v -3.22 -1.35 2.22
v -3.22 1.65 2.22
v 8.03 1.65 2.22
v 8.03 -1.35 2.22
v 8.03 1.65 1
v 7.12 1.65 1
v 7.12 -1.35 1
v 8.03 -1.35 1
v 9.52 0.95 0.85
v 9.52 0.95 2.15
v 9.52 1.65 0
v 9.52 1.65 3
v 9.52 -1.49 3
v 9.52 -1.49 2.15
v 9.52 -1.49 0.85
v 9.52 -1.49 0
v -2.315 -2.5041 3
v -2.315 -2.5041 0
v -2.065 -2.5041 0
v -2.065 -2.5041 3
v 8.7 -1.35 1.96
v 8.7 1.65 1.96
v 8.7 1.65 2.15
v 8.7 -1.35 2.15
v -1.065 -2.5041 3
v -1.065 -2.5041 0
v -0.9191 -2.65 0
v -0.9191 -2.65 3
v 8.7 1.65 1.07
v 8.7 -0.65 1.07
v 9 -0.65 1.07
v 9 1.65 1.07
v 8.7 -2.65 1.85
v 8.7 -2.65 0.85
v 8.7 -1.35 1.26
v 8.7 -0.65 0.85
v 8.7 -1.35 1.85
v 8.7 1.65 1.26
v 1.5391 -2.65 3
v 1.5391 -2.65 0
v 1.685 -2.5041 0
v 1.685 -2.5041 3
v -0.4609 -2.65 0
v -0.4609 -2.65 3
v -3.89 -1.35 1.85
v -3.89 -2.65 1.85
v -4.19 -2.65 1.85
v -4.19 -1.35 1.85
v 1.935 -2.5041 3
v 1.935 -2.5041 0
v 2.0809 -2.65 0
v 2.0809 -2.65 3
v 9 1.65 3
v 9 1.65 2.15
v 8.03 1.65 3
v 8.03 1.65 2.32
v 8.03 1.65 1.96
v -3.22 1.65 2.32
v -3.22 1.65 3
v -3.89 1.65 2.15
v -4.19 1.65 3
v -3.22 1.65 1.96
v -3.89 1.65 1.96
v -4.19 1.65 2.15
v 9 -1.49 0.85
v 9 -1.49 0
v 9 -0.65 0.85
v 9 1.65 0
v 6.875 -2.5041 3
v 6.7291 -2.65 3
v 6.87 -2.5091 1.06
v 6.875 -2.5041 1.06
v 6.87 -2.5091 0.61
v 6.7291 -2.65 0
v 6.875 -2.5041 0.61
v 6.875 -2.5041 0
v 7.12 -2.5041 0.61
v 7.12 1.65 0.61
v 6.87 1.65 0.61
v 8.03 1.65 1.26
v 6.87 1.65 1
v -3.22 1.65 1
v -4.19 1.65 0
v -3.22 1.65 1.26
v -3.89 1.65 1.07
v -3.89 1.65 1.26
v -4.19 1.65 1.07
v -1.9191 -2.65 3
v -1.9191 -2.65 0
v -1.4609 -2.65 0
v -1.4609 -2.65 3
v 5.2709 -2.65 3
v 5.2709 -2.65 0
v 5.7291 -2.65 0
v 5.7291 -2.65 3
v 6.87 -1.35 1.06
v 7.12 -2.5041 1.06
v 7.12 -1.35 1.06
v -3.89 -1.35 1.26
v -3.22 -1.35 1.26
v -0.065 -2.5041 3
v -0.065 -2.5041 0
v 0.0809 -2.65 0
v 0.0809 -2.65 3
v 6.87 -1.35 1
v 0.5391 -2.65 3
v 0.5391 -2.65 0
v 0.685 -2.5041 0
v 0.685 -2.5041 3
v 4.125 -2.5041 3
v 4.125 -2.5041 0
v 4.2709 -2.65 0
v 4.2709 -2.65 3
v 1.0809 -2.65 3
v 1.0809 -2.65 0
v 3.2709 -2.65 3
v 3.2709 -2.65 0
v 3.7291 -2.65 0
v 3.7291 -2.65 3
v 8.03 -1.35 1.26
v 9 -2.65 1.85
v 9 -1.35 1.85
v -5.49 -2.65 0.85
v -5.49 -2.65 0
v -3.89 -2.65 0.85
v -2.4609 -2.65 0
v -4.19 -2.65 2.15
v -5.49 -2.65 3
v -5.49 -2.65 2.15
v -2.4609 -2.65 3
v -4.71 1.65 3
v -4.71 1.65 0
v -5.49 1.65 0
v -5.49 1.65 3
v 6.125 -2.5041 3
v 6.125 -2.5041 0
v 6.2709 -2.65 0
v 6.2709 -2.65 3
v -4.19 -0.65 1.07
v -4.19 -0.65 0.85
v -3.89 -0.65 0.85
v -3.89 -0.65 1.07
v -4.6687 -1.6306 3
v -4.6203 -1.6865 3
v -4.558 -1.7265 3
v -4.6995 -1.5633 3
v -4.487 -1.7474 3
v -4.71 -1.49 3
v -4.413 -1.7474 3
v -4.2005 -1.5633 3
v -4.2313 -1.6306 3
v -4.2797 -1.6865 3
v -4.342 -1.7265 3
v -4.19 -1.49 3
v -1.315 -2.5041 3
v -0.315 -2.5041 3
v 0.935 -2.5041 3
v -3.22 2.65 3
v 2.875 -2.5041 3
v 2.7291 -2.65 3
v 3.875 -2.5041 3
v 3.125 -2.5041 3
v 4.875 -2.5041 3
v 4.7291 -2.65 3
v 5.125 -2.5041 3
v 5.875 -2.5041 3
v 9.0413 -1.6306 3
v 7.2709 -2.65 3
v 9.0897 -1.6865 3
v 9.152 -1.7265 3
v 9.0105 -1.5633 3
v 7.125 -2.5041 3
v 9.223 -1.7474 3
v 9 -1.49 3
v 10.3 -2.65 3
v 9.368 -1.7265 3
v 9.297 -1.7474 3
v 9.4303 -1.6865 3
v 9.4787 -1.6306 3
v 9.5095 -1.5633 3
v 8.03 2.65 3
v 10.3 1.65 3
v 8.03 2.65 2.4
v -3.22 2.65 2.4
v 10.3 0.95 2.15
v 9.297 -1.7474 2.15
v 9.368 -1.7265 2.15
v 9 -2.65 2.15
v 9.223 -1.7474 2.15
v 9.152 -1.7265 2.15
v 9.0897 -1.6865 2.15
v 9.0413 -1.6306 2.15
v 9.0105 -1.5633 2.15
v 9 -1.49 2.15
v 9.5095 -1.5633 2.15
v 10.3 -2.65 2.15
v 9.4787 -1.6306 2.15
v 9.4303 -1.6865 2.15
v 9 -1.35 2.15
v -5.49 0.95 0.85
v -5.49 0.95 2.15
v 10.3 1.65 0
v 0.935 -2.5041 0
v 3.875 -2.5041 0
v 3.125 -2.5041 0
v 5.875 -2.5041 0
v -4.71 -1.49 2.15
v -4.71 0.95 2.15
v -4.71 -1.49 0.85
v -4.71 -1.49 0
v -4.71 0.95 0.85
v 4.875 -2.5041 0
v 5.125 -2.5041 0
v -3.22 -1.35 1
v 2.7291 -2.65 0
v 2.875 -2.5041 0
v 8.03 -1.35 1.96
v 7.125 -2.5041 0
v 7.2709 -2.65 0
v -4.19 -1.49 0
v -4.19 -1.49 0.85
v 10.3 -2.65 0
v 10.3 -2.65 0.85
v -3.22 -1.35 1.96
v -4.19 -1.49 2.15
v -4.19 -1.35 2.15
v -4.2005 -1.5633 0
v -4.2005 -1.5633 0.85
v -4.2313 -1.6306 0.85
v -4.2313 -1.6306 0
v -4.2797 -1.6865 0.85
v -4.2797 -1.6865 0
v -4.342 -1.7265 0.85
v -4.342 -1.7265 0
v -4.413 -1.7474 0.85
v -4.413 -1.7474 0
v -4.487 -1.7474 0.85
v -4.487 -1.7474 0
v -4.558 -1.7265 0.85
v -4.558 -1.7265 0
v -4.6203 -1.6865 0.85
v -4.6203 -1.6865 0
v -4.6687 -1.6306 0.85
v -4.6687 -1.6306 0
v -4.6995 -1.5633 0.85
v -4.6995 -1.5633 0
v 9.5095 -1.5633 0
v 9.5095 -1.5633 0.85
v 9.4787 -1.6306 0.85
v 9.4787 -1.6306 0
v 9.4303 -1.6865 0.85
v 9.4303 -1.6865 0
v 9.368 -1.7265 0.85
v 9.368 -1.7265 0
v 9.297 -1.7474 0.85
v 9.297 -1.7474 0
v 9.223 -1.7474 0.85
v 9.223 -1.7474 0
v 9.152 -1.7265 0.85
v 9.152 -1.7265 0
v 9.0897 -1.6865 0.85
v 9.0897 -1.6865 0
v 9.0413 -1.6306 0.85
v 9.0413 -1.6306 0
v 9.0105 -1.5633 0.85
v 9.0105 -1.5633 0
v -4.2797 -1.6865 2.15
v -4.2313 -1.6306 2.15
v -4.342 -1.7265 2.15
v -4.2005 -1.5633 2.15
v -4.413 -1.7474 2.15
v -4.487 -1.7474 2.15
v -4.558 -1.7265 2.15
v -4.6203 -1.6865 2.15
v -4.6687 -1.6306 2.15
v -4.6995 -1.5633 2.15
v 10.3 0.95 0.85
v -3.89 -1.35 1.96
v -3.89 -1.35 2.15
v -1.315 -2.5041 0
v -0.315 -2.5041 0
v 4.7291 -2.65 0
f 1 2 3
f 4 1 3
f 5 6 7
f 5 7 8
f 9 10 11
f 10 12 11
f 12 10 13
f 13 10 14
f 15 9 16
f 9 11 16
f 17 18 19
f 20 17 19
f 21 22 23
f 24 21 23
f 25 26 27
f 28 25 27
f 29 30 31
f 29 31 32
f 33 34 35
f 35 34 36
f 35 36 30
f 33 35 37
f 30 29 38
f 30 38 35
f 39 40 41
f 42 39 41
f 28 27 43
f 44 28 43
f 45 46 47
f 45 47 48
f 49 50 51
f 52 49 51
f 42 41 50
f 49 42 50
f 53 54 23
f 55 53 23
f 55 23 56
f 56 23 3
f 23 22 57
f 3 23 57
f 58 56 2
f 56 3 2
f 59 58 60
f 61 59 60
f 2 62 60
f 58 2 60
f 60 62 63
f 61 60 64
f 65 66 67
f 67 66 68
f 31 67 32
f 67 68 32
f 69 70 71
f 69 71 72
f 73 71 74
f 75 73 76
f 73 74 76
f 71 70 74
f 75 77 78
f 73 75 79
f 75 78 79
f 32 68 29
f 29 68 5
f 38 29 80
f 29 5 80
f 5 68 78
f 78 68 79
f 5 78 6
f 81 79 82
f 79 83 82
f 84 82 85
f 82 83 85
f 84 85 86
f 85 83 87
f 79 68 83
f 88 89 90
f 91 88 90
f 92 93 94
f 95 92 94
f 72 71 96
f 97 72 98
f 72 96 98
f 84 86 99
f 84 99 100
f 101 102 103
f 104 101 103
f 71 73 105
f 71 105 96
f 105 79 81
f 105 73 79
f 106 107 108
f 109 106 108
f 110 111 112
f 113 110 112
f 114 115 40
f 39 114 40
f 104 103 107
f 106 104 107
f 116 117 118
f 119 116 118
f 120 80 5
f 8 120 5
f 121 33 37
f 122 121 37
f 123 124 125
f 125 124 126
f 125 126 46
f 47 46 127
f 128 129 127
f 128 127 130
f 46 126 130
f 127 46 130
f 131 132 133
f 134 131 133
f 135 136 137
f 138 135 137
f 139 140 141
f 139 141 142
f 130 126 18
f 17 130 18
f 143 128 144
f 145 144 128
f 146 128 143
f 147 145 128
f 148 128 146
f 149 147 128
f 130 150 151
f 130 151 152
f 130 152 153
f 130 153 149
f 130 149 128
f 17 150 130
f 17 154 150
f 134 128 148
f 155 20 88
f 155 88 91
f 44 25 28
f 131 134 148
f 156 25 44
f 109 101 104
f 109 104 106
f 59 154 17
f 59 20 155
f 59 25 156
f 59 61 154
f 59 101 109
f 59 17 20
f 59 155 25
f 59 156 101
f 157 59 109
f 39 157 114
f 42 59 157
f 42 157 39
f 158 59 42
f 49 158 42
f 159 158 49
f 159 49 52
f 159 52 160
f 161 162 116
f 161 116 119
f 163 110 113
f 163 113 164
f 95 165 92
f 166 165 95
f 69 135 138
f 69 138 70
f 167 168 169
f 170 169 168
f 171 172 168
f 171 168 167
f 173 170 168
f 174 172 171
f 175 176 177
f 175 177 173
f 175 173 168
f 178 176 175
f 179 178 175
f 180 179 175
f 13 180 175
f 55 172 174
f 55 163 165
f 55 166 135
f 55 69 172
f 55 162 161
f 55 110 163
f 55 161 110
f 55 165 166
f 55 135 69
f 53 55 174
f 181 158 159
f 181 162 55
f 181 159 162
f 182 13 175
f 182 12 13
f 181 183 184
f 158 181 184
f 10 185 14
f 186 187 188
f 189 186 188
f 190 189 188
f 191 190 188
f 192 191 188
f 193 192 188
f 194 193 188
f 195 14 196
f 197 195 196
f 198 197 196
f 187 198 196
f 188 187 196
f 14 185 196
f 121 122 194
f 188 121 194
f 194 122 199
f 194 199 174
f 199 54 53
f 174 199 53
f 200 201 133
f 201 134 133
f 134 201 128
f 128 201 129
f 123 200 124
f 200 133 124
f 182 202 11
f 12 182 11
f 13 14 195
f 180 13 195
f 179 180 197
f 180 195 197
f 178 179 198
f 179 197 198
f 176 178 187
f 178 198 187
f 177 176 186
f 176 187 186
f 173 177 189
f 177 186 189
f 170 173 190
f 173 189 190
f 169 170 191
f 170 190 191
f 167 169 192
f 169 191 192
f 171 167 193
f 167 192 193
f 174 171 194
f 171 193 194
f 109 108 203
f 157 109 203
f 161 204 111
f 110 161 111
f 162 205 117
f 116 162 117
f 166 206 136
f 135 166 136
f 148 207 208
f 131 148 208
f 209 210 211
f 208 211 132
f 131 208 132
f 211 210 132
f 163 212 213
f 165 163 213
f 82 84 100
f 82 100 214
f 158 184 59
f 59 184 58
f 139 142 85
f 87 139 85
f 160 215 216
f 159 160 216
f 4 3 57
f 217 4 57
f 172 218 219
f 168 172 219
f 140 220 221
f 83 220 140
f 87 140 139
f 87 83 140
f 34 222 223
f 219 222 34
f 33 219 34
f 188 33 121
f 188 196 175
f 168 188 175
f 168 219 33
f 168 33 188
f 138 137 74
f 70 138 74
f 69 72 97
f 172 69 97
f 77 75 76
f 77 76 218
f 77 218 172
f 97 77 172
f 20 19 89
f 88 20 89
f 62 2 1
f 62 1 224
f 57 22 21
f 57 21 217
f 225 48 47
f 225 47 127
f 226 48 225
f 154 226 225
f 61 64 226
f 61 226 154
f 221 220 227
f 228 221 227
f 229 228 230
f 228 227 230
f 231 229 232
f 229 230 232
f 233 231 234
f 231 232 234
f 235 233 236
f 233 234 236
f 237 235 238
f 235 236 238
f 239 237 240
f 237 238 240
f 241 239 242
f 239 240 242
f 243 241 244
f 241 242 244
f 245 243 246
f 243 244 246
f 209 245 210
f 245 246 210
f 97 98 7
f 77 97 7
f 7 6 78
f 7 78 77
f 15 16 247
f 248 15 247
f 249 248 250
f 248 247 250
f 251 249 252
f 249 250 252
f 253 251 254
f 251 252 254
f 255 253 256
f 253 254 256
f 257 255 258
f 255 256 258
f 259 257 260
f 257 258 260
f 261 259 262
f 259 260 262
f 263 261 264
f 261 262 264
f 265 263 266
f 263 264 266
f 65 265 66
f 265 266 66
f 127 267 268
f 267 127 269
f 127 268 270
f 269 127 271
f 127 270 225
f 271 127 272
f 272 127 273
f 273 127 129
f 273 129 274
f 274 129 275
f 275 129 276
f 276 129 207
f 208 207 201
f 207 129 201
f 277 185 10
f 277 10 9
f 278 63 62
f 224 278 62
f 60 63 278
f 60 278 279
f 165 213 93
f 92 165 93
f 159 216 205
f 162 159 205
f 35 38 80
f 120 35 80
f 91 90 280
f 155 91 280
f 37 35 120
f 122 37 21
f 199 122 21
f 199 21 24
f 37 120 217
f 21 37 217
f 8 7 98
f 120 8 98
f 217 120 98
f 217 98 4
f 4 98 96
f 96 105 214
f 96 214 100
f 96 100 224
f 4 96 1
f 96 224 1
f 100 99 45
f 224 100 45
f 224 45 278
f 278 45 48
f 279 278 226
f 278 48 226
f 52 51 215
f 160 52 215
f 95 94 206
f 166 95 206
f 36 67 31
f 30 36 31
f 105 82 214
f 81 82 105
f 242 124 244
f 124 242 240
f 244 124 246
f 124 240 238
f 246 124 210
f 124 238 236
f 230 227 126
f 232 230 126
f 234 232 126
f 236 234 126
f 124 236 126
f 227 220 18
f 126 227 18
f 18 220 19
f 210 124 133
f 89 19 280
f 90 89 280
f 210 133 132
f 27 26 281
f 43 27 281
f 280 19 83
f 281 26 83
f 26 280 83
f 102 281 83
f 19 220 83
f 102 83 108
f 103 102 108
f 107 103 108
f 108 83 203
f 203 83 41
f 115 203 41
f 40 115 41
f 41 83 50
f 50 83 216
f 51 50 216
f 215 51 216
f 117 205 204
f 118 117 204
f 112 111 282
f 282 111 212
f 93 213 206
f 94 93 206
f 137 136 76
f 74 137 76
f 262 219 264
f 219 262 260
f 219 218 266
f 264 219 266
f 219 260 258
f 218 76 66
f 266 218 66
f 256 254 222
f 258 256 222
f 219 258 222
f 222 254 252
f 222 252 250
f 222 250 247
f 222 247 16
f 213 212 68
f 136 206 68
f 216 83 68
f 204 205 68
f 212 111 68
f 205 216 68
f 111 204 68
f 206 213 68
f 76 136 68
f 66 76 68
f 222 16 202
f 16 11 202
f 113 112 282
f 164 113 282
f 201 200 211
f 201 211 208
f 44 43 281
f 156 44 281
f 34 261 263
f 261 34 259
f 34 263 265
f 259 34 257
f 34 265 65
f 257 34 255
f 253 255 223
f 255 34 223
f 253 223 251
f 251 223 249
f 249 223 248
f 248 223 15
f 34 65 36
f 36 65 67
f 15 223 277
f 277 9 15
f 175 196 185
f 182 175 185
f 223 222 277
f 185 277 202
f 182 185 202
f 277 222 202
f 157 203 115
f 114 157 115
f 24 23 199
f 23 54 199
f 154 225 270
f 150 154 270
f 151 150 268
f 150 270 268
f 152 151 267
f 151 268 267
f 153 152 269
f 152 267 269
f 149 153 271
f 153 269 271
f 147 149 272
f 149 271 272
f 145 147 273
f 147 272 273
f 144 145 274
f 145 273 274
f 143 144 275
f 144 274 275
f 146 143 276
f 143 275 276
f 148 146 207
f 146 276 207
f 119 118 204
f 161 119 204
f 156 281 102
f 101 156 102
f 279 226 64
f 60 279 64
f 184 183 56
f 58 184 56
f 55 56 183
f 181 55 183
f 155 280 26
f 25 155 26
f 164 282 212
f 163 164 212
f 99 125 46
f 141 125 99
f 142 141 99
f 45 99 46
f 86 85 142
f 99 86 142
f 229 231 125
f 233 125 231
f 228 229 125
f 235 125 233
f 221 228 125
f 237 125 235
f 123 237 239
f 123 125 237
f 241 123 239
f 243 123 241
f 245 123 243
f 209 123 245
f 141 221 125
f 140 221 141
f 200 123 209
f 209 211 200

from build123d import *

# Parameters (mm, degrees)
BOSS_EXTRUDE1_DEPTH             = 3
CUT_EXTRUDE1_DEPTH              = 19.761966848
SKETCH3_W                       = 16.06
SKETCH3_H                       = 1.22
CUT_EXTRUDE2_DEPTH              = 3
CUT_EXTRUDE3_DEPTH              = 12.557681428
CUT_EXTRUDE3_DEPTH_BACK         = 12.557681428
SKETCH5_W                       = 1.3
SKETCH5_H                       = 3.6
CUT_EXTRUDE4_DEPTH              = 1.6
CUT_EXTRUDE5_DEPTH              = 1.6
SKETCH8_W                       = 0.3
SKETCH8_H                       = 1.3
BOSS_EXTRUDE3_DEPTH             = 0.3
CUT_EXTRUDE6_REACH              = 13.558
SKETCH9_W                       = 0.97
SKETCH9_H                       = 0.7
SKETCH10_W                      = 1.3
SKETCH10_H                      = 0.995055469
CUT_EXTRUDE7_DEPTH              = 0.3
SKETCH11_W                      = 1.3
SKETCH11_H                      = 1.339878891
CUT_EXTRUDE8_DEPTH              = 0.3
SKETCH12_W                      = 0.22
SKETCH12_H                      = 2.3
BOSS_EXTRUDE4_DEPTH             = 0.3
SZKIC1_W                        = 4.81
SZKIC1_H                        = 6.619114068
WYTNIJ_WYCI_GNI_CIE1_DEPTH      = 12.050452479
WYTNIJ_WYCI_GNI_CIE1_DEPTH_BACK = 12.050452479


with BuildPart() as part:
    # Sketch1 → Boss-Extrude1 (new body)
    with BuildSketch(Plane.XY):
        with BuildLine():
            Line((4.729085478, -2.65), (4.875, -2.504085478))
            Line((4.875, -2.504085478), (5.125, -2.504085478))
            Line((5.125, -2.504085478), (5.270914522, -2.65))
            Line((5.270914522, -2.65), (5.729085478, -2.65))
            Line((5.729085478, -2.65), (5.875, -2.504085478))
            Line((5.875, -2.504085478), (6.125, -2.504085478))
            Line((6.125, -2.504085478), (6.270914522, -2.65))
            Line((6.270914522, -2.65), (6.729085478, -2.65))
            Line((6.729085478, -2.65), (6.875, -2.504085478))
            Line((6.875, -2.504085478), (7.125, -2.504085478))
            Line((7.125, -2.504085478), (7.270914522, -2.65))
            Line((7.270914522, -2.65), (10.3, -2.65))
            Line((10.3, -2.65), (10.3, 1.65))
            Line((10.3, 1.65), (9.52, 1.65))
            Line((9.52, 1.65), (9.52, -1.49))
            ThreePointArc((9.52, -1.49), (9.26, -1.75), (9, -1.49))
            Line((9, -1.49), (9, 1.65))
            Line((9, 1.65), (8.03, 1.65))
            Line((8.03, 1.65), (8.03, 2.65))
            Line((8.03, 2.65), (-8.03, 2.65))
            Line((-8.03, 2.65), (-8.03, 1.65))
            Line((-8.03, 1.65), (-9, 1.65))
            Line((-9, 1.65), (-9, -1.49))
            ThreePointArc((-9, -1.49), (-9.26, -1.75), (-9.52, -1.49))
            Line((-9.52, -1.49), (-9.52, 1.65))
            Line((-9.52, 1.65), (-10.3, 1.65))
            Line((-10.3, 1.65), (-10.3, -2.65))
            Line((-10.3, -2.65), (-7.270914522, -2.65))
            Line((-7.270914522, -2.65), (-7.125, -2.504085478))
            Line((-7.125, -2.504085478), (-6.875, -2.504085478))
            Line((-6.875, -2.504085478), (-6.729085478, -2.65))
            Line((-6.729085478, -2.65), (-6.270914522, -2.65))
            Line((-6.270914522, -2.65), (-6.125, -2.504085478))
            Line((-6.125, -2.504085478), (-5.875, -2.504085478))
            Line((-5.875, -2.504085478), (-5.729085478, -2.65))
            Line((-5.729085478, -2.65), (-5.270914522, -2.65))
            Line((-5.270914522, -2.65), (-5.125, -2.504085478))
            Line((-5.125, -2.504085478), (-4.875, -2.504085478))
            Line((-4.875, -2.504085478), (-4.729085478, -2.65))
            Line((-4.729085478, -2.65), (-4.270914522, -2.65))
            Line((-4.270914522, -2.65), (-4.125, -2.504085478))
            Line((-4.125, -2.504085478), (-3.875, -2.504085478))
            Line((-3.875, -2.504085478), (-3.729085478, -2.65))
            Line((-3.729085478, -2.65), (-3.270914522, -2.65))
            Line((-3.270914522, -2.65), (-3.125, -2.504085478))
            Line((-3.125, -2.504085478), (-2.875, -2.504085478))
            Line((-2.875, -2.504085478), (-2.729085478, -2.65))
            Line((-2.729085478, -2.65), (-2.270914522, -2.65))
            Line((-2.270914522, -2.65), (-2.125, -2.504085478))
            Line((-2.125, -2.504085478), (-1.875, -2.504085478))
            Line((-1.875, -2.504085478), (-1.729085478, -2.65))
            Line((-1.729085478, -2.65), (-1.270914522, -2.65))
            Line((-1.270914522, -2.65), (-1.125, -2.504085478))
            Line((-1.125, -2.504085478), (-0.875, -2.504085478))
            Line((-0.875, -2.504085478), (-0.729085478, -2.65))
            Line((-0.729085478, -2.65), (-0.270914522, -2.65))
            Line((-0.270914522, -2.65), (-0.125, -2.504085478))
            Line((-0.125, -2.504085478), (0.125, -2.504085478))
            Line((0.125, -2.504085478), (0.270914522, -2.65))
            Line((0.270914522, -2.65), (0.729085478, -2.65))
            Line((0.729085478, -2.65), (0.875, -2.504085478))
            Line((0.875, -2.504085478), (1.125, -2.504085478))
            Line((1.125, -2.504085478), (1.270914522, -2.65))
            Line((1.270914522, -2.65), (1.729085478, -2.65))
            Line((1.729085478, -2.65), (1.875, -2.504085478))
            Line((1.875, -2.504085478), (2.125, -2.504085478))
            Line((2.125, -2.504085478), (2.270914522, -2.65))
            Line((2.270914522, -2.65), (2.729085478, -2.65))
            Line((2.729085478, -2.65), (2.875, -2.504085478))
            Line((2.875, -2.504085478), (3.125, -2.504085478))
            Line((3.125, -2.504085478), (3.270914522, -2.65))
            Line((3.270914522, -2.65), (3.729085478, -2.65))
            Line((3.729085478, -2.65), (3.875, -2.504085478))
            Line((3.875, -2.504085478), (4.125, -2.504085478))
            Line((4.125, -2.504085478), (4.270914522, -2.65))
            Line((4.270914522, -2.65), (4.729085478, -2.65))
        make_face()
    extrude(amount=BOSS_EXTRUDE1_DEPTH)

    # Sketch2 → Cut-Extrude1 (cut, through all)
    with BuildSketch(Plane(origin=(8.03, 0, 0), x_dir=(0, 0, -1), z_dir=(1, 0, 0))):
        Polygon((-2.4, 2.65), (-2.32, 1.65), (0.208388731, 1.65), (0.247686287, 2.908353898), align=None)
    extrude(amount=-CUT_EXTRUDE1_DEPTH, mode=Mode.SUBTRACT)

    # Sketch3 → Cut-Extrude2 (cut)
    with BuildSketch(Plane(origin=(0, 1.65, 0), x_dir=(1, 0, 0), z_dir=(0, 1, 0))):
        with Locations((0, -1.61)):
            Rectangle(SKETCH3_W, SKETCH3_H)
    extrude(amount=-CUT_EXTRUDE2_DEPTH, mode=Mode.SUBTRACT)

    # Sketch4 → Cut-Extrude3 (cut, two sides)
    with BuildSketch(Plane(origin=(0, 1.65, 0), x_dir=(1, 0, 0), z_dir=(0, 1, 0))) as cut_extrude3_sk:
        Polygon((7.12, -1), (7.12, -0.61), (6.87, -0.61), (6.87, -1.06), (7.12, -1.06), align=None)
    extrude(amount=CUT_EXTRUDE3_DEPTH, mode=Mode.SUBTRACT)
    extrude(cut_extrude3_sk.sketch, amount=-CUT_EXTRUDE3_DEPTH_BACK, mode=Mode.SUBTRACT)

    # Sketch5 → Cut-Extrude4 (cut)
    with BuildSketch(Plane.ZY.offset(10.3)):
        with Locations((1.5, -0.85)):
            Rectangle(SKETCH5_W, SKETCH5_H)
    extrude(amount=-CUT_EXTRUDE4_DEPTH, mode=Mode.SUBTRACT)

    # Sketch6 → Cut-Extrude5 (cut)
    with BuildSketch(Plane(origin=(10.3, 0, 0), x_dir=(0, 0, -1), z_dir=(1, 0, 0))):
        Polygon((-2.15, 0.95), (-0.85, 0.95), (-0.85, -1.49), (-0.85, -2.65), (-2.15, -2.65), (-2.15, -1.49), align=None)
    extrude(amount=-CUT_EXTRUDE5_DEPTH, mode=Mode.SUBTRACT)

    # Sketch8 → Boss-Extrude3 (add)
    with BuildSketch(Plane.ZY.offset(8.7)):
        with Locations((2, -2)):
            Rectangle(SKETCH8_W, SKETCH8_H)
    boss_extrude3 = extrude(amount=BOSS_EXTRUDE3_DEPTH)

    # Cut-Extrude6: up to this face of the body (flat: up to its plane)
    cut_extrude6_end = Plane(part.part.faces().sort_by_distance((-0.005359277, -1.35, 1.610444372))[0])
    # Sketch9 → Cut-Extrude6 (cut, up to the picked face)
    with BuildSketch(Plane(origin=(0, 1.65, 0), x_dir=(1, 0, 0), z_dir=(0, 1, 0)), mode=Mode.PRIVATE) as cut_extrude6_sk1:
        with Locations((-8.515, -1.61)):
            Rectangle(SKETCH9_W, SKETCH9_H)
    cut_extrude6_tool1 = split(extrude(cut_extrude6_sk1.sketch, amount=-CUT_EXTRUDE6_REACH, mode=Mode.PRIVATE), bisect_by=cut_extrude6_end, keep=Keep.BOTH, mode=Mode.PRIVATE)
    cut_extrude6 = cut_extrude6_tool1.solids().sort_by(Axis((-8.515, 1.65, 1.61), (0, -1, 0)))[0]
    add(cut_extrude6, mode=Mode.SUBTRACT)

    # Mirror2: Cut-Extrude6 across plane
    add(cut_extrude6.mirror(Plane.ZY), mode=Mode.SUBTRACT)

    # Sketch10 → Cut-Extrude7 (cut)
    with BuildSketch(Plane.ZY.offset(9)):
        with Locations((1.5, 1.447527735)):
            Rectangle(SKETCH10_W, SKETCH10_H)
    extrude(amount=-CUT_EXTRUDE7_DEPTH, mode=Mode.SUBTRACT)

    # Sketch11 → Cut-Extrude8 (cut)
    with BuildSketch(Plane(origin=(9, 0, 0), x_dir=(0, 0, -1), z_dir=(1, 0, 0))):
        with Locations((-1.5, 1.619939446)):
            Rectangle(SKETCH11_W, SKETCH11_H)
    extrude(amount=-CUT_EXTRUDE8_DEPTH, mode=Mode.SUBTRACT)

    # Sketch12 → Boss-Extrude4 (add)
    with BuildSketch(Plane.ZY.offset(8.7)):
        with Locations((0.96, 0.5)):
            Rectangle(SKETCH12_W, SKETCH12_H)
    boss_extrude4 = extrude(amount=BOSS_EXTRUDE4_DEPTH)

    # Mirror4: Boss-Extrude4 across plane
    add(boss_extrude4.mirror(Plane.ZY))

    # Mirror5: Boss-Extrude3 across plane
    add(boss_extrude3.mirror(Plane.ZY))

    # Szkic1 → Wytnij-wyciągnięcie1 (cut, two sides)
    with BuildSketch(Plane.XY.offset(3)) as wytnij_wyci_gni_cie1_sk:
        with Locations((0, -0.145396272)):
            Rectangle(SZKIC1_W, SZKIC1_H)
    extrude(amount=WYTNIJ_WYCI_GNI_CIE1_DEPTH, mode=Mode.SUBTRACT)
    extrude(wytnij_wyci_gni_cie1_sk.sketch, amount=-WYTNIJ_WYCI_GNI_CIE1_DEPTH_BACK, mode=Mode.SUBTRACT)


with BuildPart() as wytnij_wyci_gni_cie1_piece_1:
    # of the separate pieces the step leaves, piece 1, a body of its own (wytnij_wyci_gni_cie1_pieces)
    add(part.part.solids().sort_by_distance((-2.405, -2.65, 0))[0])


with BuildPart() as wytnij_wyci_gni_cie1_piece_2:
    # of the separate pieces the step leaves, piece 2, a body of its own (wytnij_wyci_gni_cie1_pieces)
    add(part.part.solids().sort_by_distance((3.729085478, -2.65, 0))[0])


with BuildPart() as wytnij_wyci_gni_cie1_piece_1_1:
    # Obiekt-Przenieś/Kopiuj1: moved
    add(wytnij_wyci_gni_cie1_piece_1.part.moved(Location((4.81, 0, 0))))

    # Połącz1: union Wytnij-wyciągnięcie1 piece 2
    add(wytnij_wyci_gni_cie1_piece_2.part)


solid = wytnij_wyci_gni_cie1_piece_1_1.part
